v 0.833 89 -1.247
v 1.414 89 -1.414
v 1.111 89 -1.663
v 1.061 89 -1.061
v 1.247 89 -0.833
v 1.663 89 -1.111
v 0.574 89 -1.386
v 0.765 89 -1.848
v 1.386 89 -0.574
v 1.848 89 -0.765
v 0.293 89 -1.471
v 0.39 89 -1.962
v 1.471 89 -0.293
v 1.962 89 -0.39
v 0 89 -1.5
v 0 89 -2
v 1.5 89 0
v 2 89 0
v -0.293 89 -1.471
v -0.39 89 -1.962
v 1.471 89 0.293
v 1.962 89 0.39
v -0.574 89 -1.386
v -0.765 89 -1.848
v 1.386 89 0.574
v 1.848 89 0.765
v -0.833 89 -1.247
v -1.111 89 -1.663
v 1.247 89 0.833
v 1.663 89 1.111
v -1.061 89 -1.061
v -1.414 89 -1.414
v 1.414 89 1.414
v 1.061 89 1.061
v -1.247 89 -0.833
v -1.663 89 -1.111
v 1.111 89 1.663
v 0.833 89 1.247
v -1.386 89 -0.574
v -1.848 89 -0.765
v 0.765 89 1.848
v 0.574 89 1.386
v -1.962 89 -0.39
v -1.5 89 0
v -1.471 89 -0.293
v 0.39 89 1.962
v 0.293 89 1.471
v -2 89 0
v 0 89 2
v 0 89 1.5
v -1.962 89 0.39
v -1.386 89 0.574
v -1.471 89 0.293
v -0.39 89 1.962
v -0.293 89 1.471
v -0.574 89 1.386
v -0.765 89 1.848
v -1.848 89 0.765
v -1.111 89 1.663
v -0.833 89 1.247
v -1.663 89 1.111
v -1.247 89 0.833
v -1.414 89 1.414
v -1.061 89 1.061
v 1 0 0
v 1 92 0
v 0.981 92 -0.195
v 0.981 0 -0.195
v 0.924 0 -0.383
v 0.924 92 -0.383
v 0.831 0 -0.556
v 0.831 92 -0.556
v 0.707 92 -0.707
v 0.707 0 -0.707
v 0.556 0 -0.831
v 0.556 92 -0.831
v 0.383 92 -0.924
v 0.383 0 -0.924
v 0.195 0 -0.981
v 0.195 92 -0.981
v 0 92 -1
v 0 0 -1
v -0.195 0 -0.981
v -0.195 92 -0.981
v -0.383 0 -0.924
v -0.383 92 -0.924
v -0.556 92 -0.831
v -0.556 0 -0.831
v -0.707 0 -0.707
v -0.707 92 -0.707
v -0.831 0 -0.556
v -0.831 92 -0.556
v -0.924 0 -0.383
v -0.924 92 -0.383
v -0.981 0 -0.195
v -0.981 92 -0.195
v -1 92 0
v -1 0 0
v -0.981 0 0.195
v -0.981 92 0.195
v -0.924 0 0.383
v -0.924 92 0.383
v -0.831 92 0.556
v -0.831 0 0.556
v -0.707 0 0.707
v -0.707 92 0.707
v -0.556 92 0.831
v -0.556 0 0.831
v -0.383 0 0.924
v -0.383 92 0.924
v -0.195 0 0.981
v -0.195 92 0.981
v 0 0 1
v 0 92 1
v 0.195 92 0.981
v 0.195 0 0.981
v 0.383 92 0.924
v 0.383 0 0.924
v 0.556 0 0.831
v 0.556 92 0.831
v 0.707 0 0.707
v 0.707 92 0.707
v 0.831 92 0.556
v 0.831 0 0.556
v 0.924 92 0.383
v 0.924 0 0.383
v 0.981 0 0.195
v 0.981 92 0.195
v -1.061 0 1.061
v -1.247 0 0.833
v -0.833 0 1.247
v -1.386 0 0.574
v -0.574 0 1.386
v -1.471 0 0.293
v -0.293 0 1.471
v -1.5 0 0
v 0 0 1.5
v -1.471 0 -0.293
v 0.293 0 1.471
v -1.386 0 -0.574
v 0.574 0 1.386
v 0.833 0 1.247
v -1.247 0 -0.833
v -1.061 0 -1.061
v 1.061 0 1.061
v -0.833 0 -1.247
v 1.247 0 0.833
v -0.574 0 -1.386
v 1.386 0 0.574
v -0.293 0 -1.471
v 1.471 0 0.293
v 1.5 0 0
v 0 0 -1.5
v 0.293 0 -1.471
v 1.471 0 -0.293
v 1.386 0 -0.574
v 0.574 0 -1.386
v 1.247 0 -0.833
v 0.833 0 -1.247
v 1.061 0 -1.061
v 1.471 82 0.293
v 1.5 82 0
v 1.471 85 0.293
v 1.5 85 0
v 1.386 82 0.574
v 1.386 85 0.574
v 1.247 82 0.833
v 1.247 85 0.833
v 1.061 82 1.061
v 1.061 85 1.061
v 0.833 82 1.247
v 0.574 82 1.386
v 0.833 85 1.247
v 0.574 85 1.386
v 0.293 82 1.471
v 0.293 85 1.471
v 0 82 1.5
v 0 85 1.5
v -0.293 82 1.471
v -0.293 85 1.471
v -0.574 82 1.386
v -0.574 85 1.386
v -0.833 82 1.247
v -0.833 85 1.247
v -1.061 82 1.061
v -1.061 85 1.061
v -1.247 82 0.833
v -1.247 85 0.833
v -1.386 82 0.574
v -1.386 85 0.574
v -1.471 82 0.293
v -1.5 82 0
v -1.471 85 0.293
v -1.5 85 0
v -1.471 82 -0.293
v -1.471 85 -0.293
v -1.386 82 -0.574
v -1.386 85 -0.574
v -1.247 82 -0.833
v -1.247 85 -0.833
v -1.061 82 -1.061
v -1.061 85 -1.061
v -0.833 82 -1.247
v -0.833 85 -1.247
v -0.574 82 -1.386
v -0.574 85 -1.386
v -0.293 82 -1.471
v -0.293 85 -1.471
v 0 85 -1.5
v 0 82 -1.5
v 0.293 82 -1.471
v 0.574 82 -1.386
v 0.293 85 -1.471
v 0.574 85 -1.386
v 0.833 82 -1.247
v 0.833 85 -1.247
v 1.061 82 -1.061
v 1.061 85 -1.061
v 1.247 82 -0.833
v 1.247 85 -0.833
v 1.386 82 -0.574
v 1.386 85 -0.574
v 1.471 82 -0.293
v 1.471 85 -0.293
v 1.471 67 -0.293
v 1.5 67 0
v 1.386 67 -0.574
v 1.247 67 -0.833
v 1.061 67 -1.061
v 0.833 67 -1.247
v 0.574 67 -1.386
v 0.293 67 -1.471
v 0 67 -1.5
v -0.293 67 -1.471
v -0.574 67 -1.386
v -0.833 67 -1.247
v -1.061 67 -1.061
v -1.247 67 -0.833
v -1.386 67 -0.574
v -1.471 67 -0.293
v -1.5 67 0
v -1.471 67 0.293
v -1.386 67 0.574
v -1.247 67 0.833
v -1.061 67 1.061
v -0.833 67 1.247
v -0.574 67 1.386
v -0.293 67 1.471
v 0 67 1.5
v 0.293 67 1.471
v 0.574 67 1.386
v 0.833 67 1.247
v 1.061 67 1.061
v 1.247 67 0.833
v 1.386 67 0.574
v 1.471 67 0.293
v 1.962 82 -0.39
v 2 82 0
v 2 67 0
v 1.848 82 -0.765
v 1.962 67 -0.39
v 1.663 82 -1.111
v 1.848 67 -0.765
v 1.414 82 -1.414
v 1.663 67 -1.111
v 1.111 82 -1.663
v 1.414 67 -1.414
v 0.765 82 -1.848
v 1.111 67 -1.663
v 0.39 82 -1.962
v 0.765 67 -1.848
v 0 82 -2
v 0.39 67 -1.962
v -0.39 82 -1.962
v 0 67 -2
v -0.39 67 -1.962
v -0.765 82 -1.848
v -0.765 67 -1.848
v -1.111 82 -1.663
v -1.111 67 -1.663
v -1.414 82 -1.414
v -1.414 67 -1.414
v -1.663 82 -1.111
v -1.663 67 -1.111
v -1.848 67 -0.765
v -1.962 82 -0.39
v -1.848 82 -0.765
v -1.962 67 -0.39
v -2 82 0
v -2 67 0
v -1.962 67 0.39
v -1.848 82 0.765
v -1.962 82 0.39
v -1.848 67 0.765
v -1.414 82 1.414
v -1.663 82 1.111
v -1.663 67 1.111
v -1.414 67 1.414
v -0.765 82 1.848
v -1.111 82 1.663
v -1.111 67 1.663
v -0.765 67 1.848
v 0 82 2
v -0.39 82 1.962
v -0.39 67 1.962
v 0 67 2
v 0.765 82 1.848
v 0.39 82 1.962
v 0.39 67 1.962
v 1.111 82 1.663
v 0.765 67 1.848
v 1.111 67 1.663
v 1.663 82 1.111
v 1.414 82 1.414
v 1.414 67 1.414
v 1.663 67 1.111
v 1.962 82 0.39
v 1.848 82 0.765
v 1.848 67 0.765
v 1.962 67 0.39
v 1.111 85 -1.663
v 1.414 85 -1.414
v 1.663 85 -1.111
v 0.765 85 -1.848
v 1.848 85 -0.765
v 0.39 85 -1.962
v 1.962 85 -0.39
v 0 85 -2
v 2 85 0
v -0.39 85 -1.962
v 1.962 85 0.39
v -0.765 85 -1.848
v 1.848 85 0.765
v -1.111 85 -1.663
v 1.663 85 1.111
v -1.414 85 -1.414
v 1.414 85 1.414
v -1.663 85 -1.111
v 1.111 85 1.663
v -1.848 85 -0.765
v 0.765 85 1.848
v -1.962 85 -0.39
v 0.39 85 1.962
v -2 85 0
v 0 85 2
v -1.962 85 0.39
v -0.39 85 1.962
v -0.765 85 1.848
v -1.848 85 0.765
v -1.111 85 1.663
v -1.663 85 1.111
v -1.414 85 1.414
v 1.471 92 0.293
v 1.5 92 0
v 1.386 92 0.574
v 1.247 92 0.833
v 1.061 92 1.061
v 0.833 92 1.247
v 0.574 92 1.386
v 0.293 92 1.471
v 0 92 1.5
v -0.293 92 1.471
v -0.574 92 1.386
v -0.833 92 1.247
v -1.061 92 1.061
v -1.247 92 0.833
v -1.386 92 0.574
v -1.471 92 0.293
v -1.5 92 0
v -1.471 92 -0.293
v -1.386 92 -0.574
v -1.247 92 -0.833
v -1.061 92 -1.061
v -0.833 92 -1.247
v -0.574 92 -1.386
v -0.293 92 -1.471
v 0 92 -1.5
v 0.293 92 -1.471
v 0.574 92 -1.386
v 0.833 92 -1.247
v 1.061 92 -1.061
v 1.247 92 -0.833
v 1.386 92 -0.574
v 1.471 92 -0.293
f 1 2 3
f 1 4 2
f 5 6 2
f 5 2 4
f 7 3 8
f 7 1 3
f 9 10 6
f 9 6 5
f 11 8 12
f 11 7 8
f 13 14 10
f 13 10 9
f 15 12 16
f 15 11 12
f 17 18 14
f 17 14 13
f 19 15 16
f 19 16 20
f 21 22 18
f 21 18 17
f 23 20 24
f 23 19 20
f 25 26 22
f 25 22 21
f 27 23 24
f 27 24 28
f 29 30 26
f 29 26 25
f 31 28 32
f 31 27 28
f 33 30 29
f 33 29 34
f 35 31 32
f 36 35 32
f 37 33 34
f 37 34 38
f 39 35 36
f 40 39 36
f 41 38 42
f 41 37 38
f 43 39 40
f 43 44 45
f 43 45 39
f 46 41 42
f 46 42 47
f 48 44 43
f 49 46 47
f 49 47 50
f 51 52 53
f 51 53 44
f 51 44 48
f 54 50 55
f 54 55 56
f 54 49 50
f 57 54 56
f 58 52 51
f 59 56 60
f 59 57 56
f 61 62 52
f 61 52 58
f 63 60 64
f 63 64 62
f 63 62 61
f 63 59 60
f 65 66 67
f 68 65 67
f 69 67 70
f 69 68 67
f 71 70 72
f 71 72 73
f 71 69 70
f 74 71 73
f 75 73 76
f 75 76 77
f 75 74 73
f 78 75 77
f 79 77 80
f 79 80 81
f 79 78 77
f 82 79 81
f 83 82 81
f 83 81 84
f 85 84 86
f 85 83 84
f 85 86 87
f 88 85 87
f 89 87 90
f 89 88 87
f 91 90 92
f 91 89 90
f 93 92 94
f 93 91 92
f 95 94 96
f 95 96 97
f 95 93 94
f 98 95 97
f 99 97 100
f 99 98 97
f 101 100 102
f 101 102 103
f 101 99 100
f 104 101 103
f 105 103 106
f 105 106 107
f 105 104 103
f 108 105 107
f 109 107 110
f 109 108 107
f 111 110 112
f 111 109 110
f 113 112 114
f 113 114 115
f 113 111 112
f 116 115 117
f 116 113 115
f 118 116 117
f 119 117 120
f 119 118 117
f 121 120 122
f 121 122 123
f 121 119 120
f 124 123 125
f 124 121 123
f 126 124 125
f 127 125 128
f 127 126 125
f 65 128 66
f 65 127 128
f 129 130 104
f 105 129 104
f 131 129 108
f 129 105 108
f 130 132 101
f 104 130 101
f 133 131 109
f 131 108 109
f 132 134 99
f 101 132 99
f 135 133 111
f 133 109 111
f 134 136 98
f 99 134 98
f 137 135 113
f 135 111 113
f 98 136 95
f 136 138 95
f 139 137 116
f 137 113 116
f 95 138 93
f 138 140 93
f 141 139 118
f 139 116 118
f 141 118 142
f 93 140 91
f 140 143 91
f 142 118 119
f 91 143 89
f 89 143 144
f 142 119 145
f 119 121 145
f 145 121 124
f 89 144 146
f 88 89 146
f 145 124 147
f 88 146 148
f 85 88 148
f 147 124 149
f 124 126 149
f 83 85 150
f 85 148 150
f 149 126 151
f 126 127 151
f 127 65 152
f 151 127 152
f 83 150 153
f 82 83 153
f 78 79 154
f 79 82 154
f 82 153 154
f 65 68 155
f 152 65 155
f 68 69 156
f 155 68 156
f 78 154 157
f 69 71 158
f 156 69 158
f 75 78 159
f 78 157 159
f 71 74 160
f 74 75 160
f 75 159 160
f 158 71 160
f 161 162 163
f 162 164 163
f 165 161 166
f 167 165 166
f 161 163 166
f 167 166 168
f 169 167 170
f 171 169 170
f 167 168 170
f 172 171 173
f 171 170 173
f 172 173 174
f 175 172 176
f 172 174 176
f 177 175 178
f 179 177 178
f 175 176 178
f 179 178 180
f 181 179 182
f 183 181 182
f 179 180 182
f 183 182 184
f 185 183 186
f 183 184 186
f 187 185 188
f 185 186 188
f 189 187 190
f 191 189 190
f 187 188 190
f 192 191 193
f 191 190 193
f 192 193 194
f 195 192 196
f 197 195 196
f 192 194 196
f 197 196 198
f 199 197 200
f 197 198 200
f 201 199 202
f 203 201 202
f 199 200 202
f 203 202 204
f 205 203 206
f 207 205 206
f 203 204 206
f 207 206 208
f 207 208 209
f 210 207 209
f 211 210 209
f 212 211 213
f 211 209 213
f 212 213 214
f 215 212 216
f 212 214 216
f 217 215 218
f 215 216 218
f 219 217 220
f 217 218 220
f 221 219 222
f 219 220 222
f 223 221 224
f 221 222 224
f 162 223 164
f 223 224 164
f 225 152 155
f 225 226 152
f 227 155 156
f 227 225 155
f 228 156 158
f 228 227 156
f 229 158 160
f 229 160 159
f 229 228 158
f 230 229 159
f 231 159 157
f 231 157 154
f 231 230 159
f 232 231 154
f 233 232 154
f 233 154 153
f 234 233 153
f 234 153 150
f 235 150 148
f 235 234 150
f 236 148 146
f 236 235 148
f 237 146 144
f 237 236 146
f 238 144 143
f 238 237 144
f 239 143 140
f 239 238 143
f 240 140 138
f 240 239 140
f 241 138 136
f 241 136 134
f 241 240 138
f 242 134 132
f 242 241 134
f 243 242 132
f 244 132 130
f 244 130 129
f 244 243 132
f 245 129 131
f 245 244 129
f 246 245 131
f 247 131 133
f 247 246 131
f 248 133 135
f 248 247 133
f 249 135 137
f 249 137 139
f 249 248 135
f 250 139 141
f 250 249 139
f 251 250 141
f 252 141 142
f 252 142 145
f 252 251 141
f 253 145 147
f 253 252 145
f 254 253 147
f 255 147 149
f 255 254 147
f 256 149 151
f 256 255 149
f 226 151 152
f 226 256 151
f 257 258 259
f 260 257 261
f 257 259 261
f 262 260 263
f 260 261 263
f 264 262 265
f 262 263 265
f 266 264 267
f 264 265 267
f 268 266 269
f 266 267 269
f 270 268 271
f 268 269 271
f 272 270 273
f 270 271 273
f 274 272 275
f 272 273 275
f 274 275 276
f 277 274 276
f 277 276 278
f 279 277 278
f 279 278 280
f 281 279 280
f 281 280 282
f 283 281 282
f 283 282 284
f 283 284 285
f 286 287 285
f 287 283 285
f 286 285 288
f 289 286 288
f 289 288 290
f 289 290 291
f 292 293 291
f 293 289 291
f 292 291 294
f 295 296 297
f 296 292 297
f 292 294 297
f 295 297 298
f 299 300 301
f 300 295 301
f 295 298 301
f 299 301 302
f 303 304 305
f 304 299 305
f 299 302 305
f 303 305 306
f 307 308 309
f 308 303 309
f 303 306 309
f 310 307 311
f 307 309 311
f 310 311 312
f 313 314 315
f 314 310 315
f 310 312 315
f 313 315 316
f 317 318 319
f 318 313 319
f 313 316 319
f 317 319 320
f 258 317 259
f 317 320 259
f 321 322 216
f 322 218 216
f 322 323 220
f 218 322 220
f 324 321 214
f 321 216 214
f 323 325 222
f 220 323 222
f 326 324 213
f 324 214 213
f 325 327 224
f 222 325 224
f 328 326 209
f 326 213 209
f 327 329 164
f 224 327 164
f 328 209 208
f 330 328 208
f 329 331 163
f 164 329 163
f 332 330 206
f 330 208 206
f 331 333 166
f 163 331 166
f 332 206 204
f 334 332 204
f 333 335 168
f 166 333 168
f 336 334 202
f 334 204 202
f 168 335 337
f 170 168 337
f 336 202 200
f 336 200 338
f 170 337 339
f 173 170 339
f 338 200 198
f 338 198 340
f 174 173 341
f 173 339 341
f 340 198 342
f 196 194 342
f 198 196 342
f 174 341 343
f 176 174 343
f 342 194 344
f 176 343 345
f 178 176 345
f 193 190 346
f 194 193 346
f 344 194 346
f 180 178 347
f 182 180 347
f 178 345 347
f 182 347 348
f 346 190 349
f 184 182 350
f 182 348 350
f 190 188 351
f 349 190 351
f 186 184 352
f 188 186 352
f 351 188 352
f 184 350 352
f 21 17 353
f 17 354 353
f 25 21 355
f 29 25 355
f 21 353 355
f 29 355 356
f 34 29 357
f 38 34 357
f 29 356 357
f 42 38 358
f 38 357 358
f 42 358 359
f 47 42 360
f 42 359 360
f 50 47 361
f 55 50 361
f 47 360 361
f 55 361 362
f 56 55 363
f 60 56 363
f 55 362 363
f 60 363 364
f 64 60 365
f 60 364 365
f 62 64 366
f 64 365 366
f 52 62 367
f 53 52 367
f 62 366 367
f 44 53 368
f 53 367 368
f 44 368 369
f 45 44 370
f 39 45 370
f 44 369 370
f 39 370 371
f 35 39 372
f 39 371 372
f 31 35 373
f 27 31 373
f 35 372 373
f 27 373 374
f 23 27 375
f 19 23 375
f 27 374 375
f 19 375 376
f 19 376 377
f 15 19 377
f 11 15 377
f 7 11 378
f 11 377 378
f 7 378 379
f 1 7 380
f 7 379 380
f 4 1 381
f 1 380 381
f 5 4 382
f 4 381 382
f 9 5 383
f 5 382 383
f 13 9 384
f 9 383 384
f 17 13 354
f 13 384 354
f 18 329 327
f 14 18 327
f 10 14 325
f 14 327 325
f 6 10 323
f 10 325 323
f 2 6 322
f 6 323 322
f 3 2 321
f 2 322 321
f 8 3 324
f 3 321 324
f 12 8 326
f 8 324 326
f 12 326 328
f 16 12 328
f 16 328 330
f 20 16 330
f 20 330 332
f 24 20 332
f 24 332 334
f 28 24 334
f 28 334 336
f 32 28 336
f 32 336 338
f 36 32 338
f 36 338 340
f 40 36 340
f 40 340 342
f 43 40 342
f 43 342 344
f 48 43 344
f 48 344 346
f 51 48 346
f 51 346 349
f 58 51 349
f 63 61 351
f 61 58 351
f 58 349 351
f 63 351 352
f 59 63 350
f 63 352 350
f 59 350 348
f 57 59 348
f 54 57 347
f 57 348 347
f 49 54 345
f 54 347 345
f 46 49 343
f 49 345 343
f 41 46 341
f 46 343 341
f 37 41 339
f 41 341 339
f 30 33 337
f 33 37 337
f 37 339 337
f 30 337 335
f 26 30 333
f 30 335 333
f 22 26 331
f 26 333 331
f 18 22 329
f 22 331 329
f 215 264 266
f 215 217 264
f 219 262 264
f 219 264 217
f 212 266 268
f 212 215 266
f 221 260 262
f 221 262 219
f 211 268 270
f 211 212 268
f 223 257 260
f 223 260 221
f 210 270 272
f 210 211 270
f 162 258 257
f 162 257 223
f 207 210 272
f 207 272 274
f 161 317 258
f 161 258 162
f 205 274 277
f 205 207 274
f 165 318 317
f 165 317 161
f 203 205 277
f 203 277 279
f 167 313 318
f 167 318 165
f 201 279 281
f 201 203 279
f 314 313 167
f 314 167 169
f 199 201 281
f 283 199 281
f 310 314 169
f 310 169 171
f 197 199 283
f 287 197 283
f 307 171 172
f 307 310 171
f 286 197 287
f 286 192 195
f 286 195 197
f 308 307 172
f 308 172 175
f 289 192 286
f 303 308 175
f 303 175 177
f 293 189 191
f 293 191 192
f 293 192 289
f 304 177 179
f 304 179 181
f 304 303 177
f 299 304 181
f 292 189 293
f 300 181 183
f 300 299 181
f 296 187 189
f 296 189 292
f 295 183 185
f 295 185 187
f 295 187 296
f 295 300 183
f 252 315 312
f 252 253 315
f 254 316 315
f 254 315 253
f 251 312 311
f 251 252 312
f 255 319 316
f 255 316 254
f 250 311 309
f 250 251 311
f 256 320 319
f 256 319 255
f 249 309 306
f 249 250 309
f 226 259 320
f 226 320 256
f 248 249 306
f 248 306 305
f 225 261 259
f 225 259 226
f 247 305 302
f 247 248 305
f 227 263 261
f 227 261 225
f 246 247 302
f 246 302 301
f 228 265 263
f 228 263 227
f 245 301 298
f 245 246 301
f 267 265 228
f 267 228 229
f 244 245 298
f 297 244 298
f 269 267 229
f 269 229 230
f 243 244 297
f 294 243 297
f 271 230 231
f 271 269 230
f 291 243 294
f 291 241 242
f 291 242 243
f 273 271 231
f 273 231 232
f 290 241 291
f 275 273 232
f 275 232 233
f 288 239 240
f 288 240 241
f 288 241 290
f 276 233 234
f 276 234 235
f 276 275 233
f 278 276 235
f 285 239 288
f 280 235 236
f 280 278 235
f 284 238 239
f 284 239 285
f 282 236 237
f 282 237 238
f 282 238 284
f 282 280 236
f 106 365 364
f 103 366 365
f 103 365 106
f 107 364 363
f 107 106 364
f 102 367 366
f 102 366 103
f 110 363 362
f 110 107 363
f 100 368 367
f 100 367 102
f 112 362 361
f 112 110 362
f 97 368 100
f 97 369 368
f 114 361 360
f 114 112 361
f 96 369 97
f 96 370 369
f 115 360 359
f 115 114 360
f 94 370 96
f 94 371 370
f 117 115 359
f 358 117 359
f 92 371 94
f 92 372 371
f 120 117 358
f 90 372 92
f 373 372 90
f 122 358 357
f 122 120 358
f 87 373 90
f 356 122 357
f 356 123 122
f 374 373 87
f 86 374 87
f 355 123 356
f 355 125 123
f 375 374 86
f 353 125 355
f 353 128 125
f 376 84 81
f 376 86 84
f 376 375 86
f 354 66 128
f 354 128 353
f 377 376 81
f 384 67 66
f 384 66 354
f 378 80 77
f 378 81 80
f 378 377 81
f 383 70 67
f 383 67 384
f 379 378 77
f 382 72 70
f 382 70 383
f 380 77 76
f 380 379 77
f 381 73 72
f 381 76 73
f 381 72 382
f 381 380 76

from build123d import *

# Parameters (mm, degrees)
SKETCH_1_R      = 2
SKETCH_1_R_2    = 1
EXTRUDE_1_DEPTH = 92
SKETCH_2_W      = 0.5
SKETCH_2_H      = 3
SKETCH_3_W      = 0.5
SKETCH_3_H      = 67


with BuildPart() as part:
    # Эскиз1 → Бобышка-Вытянуть1 (new body)
    with BuildSketch(Plane(origin=(0, 0, 0), x_dir=(1, 0, 0), z_dir=(0, 1, 0))):
        Circle(SKETCH_1_R)
        Circle(SKETCH_1_R_2, mode=Mode.SUBTRACT)
    extrude(amount=EXTRUDE_1_DEPTH)

    # Эскиз2 → Вырез-Повернуть1 (revolve, cut)
    with BuildSketch(Plane.XY):
        with Locations((1.75, 90.5)):
            Rectangle(SKETCH_2_W, SKETCH_2_H)
        with Locations((1.75, 83.5)):
            Rectangle(SKETCH_2_W, SKETCH_2_H)
    revolve(axis=Axis((0, 92, 0), (0, -1, 0)), mode=Mode.SUBTRACT)

    # Эскиз3 → Вырез-Повернуть2 (revolve, cut)
    with BuildSketch(Plane.XY):
        with Locations((1.75, 33.5)):
            Rectangle(SKETCH_3_W, SKETCH_3_H)
    revolve(axis=Axis((0, 0, 0), (0, 1, 0)), mode=Mode.SUBTRACT)


solid = part.part
